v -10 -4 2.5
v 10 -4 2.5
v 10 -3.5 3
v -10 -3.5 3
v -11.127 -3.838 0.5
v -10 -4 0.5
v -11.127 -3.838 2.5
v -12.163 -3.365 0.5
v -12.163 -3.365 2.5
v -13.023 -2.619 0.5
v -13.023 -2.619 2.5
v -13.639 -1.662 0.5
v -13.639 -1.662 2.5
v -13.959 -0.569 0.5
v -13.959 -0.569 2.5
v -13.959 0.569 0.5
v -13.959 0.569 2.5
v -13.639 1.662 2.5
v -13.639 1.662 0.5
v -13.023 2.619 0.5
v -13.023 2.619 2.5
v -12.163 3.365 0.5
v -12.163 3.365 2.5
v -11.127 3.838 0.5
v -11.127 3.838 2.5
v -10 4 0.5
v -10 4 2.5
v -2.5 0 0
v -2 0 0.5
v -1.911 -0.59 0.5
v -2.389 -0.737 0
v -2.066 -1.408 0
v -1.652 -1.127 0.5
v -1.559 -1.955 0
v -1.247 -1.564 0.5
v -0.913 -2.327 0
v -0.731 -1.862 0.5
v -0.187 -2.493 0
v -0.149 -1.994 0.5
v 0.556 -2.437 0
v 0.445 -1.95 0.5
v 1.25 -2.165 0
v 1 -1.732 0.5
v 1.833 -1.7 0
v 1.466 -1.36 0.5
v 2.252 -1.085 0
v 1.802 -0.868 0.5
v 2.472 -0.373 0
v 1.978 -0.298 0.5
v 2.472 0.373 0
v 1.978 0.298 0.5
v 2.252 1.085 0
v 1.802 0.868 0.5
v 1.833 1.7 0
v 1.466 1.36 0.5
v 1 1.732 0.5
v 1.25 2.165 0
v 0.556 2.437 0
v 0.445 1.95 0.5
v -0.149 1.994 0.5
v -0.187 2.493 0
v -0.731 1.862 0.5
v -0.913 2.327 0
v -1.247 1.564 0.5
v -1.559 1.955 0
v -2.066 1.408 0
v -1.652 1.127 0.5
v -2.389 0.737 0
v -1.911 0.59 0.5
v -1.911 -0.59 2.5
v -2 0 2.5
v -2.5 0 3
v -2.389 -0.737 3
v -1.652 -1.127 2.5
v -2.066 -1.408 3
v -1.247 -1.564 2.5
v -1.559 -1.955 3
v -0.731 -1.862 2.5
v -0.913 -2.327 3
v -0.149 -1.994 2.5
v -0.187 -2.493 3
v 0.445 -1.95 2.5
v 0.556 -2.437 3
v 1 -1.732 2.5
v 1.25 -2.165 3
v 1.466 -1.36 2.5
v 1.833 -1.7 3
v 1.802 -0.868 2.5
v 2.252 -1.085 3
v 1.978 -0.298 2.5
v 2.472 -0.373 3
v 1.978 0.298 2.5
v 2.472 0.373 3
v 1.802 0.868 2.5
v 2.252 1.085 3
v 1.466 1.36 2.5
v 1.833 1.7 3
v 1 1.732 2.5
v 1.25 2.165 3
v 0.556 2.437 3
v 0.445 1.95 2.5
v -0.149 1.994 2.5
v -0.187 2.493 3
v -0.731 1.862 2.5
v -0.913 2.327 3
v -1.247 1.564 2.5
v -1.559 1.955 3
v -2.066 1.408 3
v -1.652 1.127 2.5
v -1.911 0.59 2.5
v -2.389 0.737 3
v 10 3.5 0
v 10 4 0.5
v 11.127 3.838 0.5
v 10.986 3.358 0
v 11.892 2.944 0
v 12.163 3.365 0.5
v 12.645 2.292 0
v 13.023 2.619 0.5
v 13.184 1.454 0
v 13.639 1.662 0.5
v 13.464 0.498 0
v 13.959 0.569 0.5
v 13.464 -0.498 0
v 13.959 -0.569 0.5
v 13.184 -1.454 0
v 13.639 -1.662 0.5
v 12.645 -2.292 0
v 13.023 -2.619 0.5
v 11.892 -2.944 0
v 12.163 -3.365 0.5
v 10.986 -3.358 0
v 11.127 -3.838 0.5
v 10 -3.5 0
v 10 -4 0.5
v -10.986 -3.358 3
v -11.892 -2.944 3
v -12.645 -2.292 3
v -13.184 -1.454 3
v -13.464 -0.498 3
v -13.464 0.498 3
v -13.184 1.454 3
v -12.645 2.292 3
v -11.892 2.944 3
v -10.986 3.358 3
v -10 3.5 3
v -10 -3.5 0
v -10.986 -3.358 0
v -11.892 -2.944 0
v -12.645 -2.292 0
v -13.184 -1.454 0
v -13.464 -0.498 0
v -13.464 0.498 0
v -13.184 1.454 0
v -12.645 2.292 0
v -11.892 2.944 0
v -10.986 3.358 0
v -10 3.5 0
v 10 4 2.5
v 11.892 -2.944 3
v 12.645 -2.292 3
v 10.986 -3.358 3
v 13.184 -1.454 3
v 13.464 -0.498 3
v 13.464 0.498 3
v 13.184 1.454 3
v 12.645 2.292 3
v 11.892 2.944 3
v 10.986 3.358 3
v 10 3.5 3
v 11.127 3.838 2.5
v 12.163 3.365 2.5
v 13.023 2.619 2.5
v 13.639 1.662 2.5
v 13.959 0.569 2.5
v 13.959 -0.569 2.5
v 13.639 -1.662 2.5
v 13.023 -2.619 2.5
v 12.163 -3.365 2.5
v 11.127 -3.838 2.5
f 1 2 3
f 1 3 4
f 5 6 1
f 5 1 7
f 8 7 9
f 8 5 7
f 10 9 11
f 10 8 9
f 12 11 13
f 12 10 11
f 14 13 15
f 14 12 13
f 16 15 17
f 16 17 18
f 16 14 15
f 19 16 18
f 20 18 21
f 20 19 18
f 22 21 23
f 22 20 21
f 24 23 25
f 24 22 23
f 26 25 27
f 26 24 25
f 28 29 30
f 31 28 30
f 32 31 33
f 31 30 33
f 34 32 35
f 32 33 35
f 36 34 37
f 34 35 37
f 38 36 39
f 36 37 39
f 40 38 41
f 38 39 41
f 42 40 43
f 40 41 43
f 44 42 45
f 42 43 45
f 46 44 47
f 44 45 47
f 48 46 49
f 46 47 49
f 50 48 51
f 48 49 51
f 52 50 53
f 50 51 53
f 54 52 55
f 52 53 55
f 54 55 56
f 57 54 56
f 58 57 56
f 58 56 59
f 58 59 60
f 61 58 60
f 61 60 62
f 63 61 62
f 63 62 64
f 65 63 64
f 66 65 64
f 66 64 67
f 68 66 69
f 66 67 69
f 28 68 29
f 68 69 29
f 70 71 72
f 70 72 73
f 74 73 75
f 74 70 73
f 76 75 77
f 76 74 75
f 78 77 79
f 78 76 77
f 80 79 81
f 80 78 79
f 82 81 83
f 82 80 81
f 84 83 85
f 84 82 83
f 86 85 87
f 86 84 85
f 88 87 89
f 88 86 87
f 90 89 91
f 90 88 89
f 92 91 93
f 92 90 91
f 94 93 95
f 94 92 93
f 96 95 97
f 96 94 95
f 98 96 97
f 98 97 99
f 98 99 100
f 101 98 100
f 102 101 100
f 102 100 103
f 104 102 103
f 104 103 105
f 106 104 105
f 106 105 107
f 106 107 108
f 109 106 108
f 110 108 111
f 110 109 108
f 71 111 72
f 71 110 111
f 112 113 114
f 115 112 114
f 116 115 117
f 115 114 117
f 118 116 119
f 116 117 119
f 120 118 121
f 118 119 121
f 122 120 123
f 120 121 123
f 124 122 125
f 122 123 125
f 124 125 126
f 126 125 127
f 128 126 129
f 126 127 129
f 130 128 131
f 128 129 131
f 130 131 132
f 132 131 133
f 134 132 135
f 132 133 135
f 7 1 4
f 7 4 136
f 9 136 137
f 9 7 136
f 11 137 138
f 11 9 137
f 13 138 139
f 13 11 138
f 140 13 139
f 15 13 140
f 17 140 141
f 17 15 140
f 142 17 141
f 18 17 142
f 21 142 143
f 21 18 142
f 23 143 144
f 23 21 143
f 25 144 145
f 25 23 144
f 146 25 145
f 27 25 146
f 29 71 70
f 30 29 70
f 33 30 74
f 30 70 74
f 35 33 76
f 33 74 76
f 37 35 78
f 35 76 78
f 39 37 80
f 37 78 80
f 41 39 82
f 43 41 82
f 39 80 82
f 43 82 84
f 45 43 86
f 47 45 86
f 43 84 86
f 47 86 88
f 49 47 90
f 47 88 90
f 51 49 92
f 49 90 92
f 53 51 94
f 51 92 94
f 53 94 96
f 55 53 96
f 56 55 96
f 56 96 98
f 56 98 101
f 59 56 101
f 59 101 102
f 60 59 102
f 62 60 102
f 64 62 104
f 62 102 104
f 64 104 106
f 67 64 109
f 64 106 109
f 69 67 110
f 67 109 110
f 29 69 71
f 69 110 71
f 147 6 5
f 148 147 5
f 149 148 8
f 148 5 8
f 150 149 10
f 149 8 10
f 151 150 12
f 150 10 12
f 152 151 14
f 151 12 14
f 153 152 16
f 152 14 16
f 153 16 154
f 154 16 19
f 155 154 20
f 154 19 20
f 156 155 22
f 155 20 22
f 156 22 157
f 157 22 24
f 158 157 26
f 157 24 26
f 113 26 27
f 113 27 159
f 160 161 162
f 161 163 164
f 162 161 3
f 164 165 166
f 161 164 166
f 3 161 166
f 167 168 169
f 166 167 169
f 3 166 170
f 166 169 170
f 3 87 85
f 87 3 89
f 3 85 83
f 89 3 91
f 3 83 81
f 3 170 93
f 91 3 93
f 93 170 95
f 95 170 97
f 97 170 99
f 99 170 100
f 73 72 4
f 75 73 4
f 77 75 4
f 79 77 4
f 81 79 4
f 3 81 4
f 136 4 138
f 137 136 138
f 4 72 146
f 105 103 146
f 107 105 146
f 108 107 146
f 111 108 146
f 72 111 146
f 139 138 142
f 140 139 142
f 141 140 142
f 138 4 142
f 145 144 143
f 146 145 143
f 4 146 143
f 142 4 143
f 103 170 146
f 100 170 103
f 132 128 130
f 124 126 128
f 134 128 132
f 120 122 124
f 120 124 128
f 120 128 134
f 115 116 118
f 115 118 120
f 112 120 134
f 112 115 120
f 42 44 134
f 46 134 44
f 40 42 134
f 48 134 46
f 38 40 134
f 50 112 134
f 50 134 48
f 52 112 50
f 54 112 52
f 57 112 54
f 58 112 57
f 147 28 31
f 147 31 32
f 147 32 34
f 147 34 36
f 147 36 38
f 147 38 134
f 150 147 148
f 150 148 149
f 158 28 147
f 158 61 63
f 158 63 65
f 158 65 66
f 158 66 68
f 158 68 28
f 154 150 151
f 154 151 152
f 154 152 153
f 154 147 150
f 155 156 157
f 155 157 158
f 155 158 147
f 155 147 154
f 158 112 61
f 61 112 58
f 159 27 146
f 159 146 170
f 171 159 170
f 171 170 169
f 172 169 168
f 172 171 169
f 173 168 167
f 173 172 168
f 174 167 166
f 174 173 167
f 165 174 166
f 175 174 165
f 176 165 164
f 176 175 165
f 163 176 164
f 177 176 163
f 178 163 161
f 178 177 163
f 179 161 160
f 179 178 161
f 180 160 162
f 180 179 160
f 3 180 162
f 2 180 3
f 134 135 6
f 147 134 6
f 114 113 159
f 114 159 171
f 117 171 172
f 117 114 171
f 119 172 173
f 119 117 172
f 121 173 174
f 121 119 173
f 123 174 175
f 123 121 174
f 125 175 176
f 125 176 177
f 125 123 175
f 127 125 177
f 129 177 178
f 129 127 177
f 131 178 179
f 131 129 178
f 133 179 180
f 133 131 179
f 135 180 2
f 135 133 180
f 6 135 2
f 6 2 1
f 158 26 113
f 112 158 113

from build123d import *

# Parameters (mm, degrees)
BASE_EXTRUSION_DEPTH    = 3
ESQUISSE2_R             = 2
ENL_V_MAT_EXTRU_1_DEPTH = 3
CHANFREIN1_SIZE         = 0.5


with BuildPart() as part:
    # Esquisse1 → Base-Extrusion (new body)
    with BuildSketch(Plane.XY):
        with BuildLine():
            Line((-10, 4), (10, 4))
            ThreePointArc((10, 4), (14, 0), (10, -4))
            Line((10, -4), (-10, -4))
            ThreePointArc((-10, -4), (-14, 0), (-10, 4))
        make_face()
    extrude(amount=BASE_EXTRUSION_DEPTH)

    # Esquisse2 → Enlèv. mat.-Extru.1 (cut)
    with BuildSketch(Plane.XY.offset(3)):
        with Locations(Location((0, 0, 0), (0, 0, 180))):
            Circle(ESQUISSE2_R)
    extrude(amount=-ENL_V_MAT_EXTRU_1_DEPTH, mode=Mode.SUBTRACT)

    # Chanfrein1
    chanfrein1_edges = [part.edges().sort_by_distance(p)[0] for p in [
        (0, -4, 0),
        (0, -4, 3),
        (14, 0, 0),
        (14, 0, 3),
        (-14, 0, 0),
        (-14, 0, 3),
        (0, 4, 0),
        (2, 0, 0),
        (0, 4, 3),
        (2, 0, 3),
    ]]
    chamfer(chanfrein1_edges, length=CHANFREIN1_SIZE)


solid = part.part
